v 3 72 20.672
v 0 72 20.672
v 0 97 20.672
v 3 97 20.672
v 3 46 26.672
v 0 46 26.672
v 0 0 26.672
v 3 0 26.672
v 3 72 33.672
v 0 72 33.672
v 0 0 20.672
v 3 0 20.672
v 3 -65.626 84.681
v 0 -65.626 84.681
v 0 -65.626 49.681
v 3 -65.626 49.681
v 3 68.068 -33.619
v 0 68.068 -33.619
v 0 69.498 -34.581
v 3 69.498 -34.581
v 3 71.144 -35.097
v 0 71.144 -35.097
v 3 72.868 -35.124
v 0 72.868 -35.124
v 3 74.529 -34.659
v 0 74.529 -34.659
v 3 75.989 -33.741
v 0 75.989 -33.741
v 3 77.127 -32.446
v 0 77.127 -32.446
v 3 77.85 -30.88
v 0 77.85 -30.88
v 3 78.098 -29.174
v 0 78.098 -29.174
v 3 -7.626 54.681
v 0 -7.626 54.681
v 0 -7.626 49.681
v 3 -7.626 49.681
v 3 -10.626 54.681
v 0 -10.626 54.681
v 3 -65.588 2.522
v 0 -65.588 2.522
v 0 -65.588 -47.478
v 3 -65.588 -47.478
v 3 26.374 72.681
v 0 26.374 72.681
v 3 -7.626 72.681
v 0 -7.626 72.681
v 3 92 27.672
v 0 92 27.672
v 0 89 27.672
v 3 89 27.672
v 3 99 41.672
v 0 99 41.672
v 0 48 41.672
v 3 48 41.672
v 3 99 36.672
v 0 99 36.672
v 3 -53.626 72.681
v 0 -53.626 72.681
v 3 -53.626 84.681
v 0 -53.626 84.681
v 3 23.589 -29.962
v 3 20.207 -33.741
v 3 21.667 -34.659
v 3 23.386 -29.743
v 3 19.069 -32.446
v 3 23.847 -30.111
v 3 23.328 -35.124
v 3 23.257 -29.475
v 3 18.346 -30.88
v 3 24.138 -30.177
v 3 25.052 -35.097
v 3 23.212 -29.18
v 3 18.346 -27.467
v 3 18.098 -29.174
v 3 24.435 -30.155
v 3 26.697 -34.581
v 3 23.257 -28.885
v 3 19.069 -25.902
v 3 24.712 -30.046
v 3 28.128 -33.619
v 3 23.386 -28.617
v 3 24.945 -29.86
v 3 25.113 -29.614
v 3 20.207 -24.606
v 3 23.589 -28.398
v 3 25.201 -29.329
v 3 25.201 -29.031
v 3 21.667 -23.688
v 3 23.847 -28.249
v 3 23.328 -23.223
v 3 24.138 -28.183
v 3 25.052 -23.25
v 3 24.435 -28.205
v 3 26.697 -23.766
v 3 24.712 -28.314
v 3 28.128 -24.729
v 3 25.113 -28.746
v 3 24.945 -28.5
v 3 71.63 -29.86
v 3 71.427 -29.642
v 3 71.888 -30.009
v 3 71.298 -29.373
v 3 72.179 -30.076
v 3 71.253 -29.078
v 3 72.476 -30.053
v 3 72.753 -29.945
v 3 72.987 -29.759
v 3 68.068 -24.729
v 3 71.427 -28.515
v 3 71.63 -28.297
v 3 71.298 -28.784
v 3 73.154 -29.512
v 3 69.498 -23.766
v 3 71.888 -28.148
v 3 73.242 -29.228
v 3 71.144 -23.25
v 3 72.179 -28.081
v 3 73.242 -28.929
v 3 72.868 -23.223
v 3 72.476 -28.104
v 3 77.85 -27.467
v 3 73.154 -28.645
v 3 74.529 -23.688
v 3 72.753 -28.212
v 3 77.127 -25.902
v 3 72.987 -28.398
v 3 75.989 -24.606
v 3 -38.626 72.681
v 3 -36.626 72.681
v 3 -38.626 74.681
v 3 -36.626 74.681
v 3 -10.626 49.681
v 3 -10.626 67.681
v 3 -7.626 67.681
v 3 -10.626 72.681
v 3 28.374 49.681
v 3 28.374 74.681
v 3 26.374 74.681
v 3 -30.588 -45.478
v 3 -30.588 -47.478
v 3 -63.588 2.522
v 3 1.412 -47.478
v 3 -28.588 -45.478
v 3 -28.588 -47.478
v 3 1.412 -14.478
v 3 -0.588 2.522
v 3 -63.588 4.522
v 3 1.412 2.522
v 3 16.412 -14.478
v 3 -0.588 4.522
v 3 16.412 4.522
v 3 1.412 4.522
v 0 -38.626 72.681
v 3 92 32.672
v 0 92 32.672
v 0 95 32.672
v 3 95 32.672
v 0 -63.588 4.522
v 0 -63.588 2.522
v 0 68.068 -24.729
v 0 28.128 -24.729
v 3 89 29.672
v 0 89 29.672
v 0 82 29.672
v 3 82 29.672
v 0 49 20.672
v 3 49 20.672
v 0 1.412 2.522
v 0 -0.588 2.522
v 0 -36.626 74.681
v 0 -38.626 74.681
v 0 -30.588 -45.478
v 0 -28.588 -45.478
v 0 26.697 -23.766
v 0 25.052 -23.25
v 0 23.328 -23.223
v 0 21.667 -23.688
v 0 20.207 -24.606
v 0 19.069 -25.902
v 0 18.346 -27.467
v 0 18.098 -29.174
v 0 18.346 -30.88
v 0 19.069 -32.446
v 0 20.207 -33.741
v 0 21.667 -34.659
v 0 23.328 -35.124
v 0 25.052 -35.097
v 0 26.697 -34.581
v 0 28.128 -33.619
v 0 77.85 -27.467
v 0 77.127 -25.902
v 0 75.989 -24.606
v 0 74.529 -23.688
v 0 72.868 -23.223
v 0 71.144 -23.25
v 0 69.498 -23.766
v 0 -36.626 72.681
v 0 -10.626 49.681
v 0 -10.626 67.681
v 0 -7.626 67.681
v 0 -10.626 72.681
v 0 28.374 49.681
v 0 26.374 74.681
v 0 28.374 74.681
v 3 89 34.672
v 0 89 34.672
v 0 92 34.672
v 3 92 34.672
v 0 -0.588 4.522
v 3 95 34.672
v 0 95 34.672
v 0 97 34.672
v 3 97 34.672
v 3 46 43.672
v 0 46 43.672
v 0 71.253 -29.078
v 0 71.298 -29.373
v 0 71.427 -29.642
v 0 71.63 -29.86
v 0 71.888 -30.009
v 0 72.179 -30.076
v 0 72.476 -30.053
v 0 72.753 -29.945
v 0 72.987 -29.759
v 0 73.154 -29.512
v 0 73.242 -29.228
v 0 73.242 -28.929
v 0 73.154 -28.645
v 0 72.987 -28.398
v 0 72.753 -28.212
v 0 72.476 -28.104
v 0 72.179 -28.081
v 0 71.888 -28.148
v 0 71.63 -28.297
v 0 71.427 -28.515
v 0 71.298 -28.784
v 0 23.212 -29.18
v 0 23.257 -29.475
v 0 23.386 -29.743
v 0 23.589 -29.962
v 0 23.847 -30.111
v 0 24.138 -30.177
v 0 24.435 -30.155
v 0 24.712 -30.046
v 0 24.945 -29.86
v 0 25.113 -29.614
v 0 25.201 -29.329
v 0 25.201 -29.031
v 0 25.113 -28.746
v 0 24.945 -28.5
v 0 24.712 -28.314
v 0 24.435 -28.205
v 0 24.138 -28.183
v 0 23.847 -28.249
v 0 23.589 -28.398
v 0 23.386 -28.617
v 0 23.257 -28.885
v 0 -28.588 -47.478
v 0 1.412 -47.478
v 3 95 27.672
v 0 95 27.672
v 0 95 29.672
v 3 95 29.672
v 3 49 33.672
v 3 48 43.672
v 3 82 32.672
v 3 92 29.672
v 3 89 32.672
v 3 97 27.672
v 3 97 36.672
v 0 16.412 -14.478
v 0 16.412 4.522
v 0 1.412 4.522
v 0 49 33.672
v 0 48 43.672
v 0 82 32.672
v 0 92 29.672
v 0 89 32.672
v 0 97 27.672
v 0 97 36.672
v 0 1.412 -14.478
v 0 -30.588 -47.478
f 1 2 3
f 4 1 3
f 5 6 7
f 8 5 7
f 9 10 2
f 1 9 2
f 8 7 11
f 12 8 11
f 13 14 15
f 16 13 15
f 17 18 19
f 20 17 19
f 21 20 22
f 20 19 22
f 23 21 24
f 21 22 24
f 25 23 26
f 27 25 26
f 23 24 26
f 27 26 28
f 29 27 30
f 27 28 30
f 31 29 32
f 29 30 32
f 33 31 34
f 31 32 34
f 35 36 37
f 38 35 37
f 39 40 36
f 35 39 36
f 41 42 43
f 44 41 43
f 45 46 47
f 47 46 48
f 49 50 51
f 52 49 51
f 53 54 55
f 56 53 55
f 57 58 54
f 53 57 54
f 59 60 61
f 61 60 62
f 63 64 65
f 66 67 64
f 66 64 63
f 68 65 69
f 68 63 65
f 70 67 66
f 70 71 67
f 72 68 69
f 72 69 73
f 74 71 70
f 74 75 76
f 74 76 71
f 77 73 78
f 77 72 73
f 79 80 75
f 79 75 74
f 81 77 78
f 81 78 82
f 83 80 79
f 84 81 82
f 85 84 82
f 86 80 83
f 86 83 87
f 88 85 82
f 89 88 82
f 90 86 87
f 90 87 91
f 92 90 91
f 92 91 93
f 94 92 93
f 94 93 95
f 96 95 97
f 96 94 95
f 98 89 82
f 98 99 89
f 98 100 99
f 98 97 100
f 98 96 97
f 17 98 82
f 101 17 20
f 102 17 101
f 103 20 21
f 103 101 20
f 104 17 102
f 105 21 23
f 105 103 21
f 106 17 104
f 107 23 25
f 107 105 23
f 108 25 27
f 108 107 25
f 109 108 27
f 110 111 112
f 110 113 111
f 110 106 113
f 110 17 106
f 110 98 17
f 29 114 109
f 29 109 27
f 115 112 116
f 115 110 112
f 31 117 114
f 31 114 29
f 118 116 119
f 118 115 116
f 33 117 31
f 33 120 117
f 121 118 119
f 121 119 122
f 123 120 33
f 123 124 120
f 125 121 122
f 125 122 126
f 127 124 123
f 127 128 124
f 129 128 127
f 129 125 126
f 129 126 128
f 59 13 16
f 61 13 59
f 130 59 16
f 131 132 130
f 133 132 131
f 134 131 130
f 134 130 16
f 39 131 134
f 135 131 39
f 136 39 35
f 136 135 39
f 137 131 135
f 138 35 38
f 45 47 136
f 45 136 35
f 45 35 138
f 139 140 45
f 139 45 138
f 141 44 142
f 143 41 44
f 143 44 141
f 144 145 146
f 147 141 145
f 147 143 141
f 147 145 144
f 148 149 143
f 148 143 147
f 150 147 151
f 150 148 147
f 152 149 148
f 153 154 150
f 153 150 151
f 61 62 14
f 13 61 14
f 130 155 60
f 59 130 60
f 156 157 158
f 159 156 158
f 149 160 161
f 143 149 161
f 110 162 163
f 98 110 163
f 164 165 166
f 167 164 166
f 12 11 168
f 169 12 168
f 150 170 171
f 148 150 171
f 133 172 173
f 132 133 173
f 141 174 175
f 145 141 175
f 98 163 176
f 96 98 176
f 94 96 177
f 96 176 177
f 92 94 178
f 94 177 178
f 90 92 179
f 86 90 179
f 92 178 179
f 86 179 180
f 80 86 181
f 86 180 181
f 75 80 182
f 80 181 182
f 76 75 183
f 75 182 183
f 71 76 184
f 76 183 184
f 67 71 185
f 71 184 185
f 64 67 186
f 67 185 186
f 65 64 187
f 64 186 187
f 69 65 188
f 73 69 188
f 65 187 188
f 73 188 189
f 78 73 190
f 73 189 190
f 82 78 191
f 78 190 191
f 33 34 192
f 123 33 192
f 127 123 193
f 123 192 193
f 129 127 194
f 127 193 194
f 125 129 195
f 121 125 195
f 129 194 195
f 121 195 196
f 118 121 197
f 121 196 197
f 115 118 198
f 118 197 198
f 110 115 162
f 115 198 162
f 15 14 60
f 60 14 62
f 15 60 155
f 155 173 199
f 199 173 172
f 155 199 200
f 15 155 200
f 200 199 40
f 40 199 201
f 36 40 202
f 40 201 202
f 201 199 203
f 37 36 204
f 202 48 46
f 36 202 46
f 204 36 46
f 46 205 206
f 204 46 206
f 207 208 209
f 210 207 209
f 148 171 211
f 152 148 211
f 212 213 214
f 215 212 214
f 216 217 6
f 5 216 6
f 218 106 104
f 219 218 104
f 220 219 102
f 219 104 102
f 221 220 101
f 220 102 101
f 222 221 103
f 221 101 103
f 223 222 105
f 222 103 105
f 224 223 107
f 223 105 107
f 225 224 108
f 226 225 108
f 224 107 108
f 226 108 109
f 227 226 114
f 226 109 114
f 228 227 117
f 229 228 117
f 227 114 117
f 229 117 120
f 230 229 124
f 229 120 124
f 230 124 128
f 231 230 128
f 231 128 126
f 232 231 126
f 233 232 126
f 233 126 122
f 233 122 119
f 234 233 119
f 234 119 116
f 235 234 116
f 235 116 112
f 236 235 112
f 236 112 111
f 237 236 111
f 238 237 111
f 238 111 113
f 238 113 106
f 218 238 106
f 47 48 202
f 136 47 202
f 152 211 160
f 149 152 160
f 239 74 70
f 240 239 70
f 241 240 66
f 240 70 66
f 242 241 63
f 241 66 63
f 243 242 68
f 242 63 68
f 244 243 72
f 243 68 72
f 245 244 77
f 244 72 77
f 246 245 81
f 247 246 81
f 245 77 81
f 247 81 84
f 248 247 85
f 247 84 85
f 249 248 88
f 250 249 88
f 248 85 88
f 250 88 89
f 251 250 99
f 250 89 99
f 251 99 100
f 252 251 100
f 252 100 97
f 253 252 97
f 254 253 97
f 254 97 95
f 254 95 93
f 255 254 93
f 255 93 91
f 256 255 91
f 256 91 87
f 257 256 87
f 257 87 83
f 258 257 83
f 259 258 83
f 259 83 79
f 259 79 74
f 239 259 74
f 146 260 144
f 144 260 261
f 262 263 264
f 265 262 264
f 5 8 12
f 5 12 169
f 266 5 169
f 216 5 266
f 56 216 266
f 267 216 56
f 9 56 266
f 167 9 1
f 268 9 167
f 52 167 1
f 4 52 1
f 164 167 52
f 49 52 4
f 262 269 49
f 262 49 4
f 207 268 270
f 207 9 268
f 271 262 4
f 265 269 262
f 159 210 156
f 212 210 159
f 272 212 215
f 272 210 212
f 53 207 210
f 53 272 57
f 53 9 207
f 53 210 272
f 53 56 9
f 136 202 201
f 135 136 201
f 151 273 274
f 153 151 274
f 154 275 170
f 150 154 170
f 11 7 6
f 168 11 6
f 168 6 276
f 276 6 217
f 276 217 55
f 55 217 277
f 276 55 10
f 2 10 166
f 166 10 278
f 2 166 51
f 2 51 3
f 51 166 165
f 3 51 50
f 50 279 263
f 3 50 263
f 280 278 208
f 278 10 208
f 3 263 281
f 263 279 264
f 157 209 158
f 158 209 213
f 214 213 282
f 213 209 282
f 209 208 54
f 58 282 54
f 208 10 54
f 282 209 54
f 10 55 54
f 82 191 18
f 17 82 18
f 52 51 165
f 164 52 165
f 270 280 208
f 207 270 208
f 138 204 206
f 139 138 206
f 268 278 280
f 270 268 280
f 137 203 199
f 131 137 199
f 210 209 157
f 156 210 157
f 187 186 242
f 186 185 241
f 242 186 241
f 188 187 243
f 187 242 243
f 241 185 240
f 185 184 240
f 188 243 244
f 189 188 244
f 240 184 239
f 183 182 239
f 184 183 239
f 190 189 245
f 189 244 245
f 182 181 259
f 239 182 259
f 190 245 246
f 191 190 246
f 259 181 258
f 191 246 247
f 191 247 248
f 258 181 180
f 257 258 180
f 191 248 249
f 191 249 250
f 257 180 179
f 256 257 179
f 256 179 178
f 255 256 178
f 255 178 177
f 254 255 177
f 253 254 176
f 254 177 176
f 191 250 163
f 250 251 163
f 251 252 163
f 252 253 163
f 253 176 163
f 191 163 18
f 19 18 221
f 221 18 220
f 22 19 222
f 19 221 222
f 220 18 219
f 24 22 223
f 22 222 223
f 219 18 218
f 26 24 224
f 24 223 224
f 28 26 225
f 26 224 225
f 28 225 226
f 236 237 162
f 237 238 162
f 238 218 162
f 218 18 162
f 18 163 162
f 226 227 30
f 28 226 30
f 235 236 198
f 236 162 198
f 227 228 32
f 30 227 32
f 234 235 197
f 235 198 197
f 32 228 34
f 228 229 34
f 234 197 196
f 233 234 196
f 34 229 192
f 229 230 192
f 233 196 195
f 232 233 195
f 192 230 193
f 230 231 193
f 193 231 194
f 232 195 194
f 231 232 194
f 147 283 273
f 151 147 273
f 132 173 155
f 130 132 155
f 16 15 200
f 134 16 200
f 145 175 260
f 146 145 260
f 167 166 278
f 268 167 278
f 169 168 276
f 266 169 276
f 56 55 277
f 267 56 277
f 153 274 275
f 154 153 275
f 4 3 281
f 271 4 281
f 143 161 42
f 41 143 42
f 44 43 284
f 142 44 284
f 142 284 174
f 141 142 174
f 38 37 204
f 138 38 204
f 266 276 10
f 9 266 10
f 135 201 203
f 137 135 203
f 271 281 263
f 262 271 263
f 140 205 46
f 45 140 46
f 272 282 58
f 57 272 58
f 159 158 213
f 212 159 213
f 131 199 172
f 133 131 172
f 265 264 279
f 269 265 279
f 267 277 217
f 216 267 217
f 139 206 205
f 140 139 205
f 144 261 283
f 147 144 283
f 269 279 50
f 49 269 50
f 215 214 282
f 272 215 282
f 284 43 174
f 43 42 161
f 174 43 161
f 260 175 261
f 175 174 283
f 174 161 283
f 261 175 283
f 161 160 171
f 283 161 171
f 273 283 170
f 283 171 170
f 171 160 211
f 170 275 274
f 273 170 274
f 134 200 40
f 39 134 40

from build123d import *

# Parameters (mm, degrees)
F1_DEPTH = 3
F3_DEPTH = 3
F6_DEPTH = 3
F5_R     = 1
F7_DEPTH = 3
F9_D     = 2
F11_D    = 2


with BuildPart() as f1:
    # F0 (on Right) → F1 (new body)
    with BuildSketch(Plane.YZ):
        Polygon((-65.5879303813, 2.5217376649), (-65.5879303813, -47.4782623351), (-30.5879303813, -47.4782623351), (-30.5879303813, -45.4782623351), (-28.5879303813, -45.4782623351), (-28.5879303813, -47.4782623351), (1.4120696187, -47.4782623351), (1.4120696187, -14.4782623351), (16.4120696187, -14.4782623351), (16.4120696187, 4.5217376649), (1.4120696187, 4.5217376649), (1.4120696187, 2.5217376649), (-0.5879303813, 2.5217376649), (-0.5879303813, 4.5217376649), (-63.5879303813, 4.5217376649), (-63.5879303813, 2.5217376649), align=None)
    extrude(amount=F1_DEPTH)


with BuildPart() as f3:
    # F2 (on Right) → F3 (new body)
    with BuildSketch(Plane.YZ):
        Polygon((-65.6263157725, 84.6805161238), (-65.6263157725, 49.6805161238), (-10.6263157725, 49.6805161238), (-10.6263157725, 54.6805161238), (-7.6263157725, 54.6805161238), (-7.6263157725, 49.6805161238), (28.3736842275, 49.6805161238), (28.3736842275, 74.6805161238), (26.3736842275, 74.6805161238), (26.3736842275, 72.6805161238), (-7.6263157725, 72.6805161238), (-7.6263157725, 67.6805161238), (-10.6263157725, 67.6805161238), (-10.6263157725, 72.6805161238), (-36.6263157725, 72.6805161238), (-36.6263157725, 74.6805161238), (-38.6263157725, 74.6805161238), (-38.6263157725, 72.6805161238), (-53.6263157725, 72.6805161238), (-53.6263157725, 84.6805161238), align=None)
    extrude(amount=F3_DEPTH)


with BuildPart() as f6:
    # F4 (on Right) → F6 (new body)
    with BuildSketch(Plane.YZ):
        Polygon((46, 26.6718891859), (0, 26.6718891859), (0, 20.6718891859), (49, 20.6718891859), (49, 33.6718891859), (72, 33.6718891859), (72, 20.6718891859), (97, 20.6718891859), (97, 27.6718891859), (95, 27.6718891859), (95, 29.6718891859), (92, 29.6718891859), (92, 27.6718891859), (89, 27.6718891859), (89, 29.6718891859), (82, 29.6718891859), (82, 32.6718891859), (89, 32.6718891859), (89, 34.6718891859), (92, 34.6718891859), (92, 32.6718891859), (95, 32.6718891859), (95, 34.6718891859), (97, 34.6718891859), (97, 36.6718891859), (99, 36.6718891859), (99, 41.6718891859), (48, 41.6718891859), (48, 43.6718891859), (46, 43.6718891859), align=None)
    extrude(amount=F6_DEPTH)


with BuildPart() as f7:
    # F5 (on Right) → F7 (new body)
    with BuildSketch(Plane.YZ):
        with BuildLine():
            ThreePointArc((28.1280546868, -24.7287602043), (29.5833822285, -26.7427890303), (30.0979064256, -29.1737467051))
            ThreePointArc((30.0979064256, -29.1737467051), (29.5833822285, -31.6047043798), (28.1280546868, -33.6187332059))
            Line((28.1280546868, -33.6187332059), (68.0677581643, -33.6187332059))
            ThreePointArc((68.0677581643, -33.6187332059), (66.0979064256, -29.1737467051), (68.0677581643, -24.7287602043))
            Line((68.0677581643, -24.7287602043), (28.1280546868, -24.7287602043))
        make_face()
        with BuildLine():
            ThreePointArc((78.0979064256, -29.1737467051), (74.5288641003, -23.6882709022), (68.0677581643, -24.7287602043))
            ThreePointArc((68.0677581643, -24.7287602043), (66.0979064256, -29.1737467051), (68.0677581643, -33.6187332059))
            ThreePointArc((68.0677581643, -33.6187332059), (74.5288641003, -34.6592225079), (78.0979064256, -29.1737467051))
        make_face()
        with Locations((72.0979064256, -29.1737467051)):
            Circle(F5_R, mode=Mode.SUBTRACT)
        with BuildLine():
            ThreePointArc((28.1280546868, -33.6187332059), (29.5833822285, -31.6047043798), (30.0979064256, -29.1737467051))
            ThreePointArc((30.0979064256, -29.1737467051), (29.5833822285, -26.7427890303), (28.1280546868, -24.7287602043))
            ThreePointArc((28.1280546868, -24.7287602043), (18.0979064256, -29.1737467051), (28.1280546868, -33.6187332059))
        make_face()
        with Locations((24.0979064256, -29.1737467051)):
            Circle(F5_R, mode=Mode.SUBTRACT)
        with Locations((72.0979064256, -29.1737467051)):
            Circle(F5_R)
        with Locations((24.0979064256, -29.1737467051)):
            Circle(F5_R)
    extrude(amount=F7_DEPTH)

    # F9 (through all)
    with Locations(Plane(origin=(0, 0, 0), x_dir=(0, 1, 0), z_dir=(-1, 0, 0))):
        with Locations((24.2122728378, 29.180072248)):
            Hole(F9_D / 2)

    # F11 (through all)
    with Locations(Plane(origin=(0, 0, 0), x_dir=(0, 1, 0), z_dir=(-1, 0, 0))):
        with Locations((72.253473103, 29.0784928948)):
            Hole(F11_D / 2)


solid = Compound([f1.part, f3.part, f6.part, f7.part])
